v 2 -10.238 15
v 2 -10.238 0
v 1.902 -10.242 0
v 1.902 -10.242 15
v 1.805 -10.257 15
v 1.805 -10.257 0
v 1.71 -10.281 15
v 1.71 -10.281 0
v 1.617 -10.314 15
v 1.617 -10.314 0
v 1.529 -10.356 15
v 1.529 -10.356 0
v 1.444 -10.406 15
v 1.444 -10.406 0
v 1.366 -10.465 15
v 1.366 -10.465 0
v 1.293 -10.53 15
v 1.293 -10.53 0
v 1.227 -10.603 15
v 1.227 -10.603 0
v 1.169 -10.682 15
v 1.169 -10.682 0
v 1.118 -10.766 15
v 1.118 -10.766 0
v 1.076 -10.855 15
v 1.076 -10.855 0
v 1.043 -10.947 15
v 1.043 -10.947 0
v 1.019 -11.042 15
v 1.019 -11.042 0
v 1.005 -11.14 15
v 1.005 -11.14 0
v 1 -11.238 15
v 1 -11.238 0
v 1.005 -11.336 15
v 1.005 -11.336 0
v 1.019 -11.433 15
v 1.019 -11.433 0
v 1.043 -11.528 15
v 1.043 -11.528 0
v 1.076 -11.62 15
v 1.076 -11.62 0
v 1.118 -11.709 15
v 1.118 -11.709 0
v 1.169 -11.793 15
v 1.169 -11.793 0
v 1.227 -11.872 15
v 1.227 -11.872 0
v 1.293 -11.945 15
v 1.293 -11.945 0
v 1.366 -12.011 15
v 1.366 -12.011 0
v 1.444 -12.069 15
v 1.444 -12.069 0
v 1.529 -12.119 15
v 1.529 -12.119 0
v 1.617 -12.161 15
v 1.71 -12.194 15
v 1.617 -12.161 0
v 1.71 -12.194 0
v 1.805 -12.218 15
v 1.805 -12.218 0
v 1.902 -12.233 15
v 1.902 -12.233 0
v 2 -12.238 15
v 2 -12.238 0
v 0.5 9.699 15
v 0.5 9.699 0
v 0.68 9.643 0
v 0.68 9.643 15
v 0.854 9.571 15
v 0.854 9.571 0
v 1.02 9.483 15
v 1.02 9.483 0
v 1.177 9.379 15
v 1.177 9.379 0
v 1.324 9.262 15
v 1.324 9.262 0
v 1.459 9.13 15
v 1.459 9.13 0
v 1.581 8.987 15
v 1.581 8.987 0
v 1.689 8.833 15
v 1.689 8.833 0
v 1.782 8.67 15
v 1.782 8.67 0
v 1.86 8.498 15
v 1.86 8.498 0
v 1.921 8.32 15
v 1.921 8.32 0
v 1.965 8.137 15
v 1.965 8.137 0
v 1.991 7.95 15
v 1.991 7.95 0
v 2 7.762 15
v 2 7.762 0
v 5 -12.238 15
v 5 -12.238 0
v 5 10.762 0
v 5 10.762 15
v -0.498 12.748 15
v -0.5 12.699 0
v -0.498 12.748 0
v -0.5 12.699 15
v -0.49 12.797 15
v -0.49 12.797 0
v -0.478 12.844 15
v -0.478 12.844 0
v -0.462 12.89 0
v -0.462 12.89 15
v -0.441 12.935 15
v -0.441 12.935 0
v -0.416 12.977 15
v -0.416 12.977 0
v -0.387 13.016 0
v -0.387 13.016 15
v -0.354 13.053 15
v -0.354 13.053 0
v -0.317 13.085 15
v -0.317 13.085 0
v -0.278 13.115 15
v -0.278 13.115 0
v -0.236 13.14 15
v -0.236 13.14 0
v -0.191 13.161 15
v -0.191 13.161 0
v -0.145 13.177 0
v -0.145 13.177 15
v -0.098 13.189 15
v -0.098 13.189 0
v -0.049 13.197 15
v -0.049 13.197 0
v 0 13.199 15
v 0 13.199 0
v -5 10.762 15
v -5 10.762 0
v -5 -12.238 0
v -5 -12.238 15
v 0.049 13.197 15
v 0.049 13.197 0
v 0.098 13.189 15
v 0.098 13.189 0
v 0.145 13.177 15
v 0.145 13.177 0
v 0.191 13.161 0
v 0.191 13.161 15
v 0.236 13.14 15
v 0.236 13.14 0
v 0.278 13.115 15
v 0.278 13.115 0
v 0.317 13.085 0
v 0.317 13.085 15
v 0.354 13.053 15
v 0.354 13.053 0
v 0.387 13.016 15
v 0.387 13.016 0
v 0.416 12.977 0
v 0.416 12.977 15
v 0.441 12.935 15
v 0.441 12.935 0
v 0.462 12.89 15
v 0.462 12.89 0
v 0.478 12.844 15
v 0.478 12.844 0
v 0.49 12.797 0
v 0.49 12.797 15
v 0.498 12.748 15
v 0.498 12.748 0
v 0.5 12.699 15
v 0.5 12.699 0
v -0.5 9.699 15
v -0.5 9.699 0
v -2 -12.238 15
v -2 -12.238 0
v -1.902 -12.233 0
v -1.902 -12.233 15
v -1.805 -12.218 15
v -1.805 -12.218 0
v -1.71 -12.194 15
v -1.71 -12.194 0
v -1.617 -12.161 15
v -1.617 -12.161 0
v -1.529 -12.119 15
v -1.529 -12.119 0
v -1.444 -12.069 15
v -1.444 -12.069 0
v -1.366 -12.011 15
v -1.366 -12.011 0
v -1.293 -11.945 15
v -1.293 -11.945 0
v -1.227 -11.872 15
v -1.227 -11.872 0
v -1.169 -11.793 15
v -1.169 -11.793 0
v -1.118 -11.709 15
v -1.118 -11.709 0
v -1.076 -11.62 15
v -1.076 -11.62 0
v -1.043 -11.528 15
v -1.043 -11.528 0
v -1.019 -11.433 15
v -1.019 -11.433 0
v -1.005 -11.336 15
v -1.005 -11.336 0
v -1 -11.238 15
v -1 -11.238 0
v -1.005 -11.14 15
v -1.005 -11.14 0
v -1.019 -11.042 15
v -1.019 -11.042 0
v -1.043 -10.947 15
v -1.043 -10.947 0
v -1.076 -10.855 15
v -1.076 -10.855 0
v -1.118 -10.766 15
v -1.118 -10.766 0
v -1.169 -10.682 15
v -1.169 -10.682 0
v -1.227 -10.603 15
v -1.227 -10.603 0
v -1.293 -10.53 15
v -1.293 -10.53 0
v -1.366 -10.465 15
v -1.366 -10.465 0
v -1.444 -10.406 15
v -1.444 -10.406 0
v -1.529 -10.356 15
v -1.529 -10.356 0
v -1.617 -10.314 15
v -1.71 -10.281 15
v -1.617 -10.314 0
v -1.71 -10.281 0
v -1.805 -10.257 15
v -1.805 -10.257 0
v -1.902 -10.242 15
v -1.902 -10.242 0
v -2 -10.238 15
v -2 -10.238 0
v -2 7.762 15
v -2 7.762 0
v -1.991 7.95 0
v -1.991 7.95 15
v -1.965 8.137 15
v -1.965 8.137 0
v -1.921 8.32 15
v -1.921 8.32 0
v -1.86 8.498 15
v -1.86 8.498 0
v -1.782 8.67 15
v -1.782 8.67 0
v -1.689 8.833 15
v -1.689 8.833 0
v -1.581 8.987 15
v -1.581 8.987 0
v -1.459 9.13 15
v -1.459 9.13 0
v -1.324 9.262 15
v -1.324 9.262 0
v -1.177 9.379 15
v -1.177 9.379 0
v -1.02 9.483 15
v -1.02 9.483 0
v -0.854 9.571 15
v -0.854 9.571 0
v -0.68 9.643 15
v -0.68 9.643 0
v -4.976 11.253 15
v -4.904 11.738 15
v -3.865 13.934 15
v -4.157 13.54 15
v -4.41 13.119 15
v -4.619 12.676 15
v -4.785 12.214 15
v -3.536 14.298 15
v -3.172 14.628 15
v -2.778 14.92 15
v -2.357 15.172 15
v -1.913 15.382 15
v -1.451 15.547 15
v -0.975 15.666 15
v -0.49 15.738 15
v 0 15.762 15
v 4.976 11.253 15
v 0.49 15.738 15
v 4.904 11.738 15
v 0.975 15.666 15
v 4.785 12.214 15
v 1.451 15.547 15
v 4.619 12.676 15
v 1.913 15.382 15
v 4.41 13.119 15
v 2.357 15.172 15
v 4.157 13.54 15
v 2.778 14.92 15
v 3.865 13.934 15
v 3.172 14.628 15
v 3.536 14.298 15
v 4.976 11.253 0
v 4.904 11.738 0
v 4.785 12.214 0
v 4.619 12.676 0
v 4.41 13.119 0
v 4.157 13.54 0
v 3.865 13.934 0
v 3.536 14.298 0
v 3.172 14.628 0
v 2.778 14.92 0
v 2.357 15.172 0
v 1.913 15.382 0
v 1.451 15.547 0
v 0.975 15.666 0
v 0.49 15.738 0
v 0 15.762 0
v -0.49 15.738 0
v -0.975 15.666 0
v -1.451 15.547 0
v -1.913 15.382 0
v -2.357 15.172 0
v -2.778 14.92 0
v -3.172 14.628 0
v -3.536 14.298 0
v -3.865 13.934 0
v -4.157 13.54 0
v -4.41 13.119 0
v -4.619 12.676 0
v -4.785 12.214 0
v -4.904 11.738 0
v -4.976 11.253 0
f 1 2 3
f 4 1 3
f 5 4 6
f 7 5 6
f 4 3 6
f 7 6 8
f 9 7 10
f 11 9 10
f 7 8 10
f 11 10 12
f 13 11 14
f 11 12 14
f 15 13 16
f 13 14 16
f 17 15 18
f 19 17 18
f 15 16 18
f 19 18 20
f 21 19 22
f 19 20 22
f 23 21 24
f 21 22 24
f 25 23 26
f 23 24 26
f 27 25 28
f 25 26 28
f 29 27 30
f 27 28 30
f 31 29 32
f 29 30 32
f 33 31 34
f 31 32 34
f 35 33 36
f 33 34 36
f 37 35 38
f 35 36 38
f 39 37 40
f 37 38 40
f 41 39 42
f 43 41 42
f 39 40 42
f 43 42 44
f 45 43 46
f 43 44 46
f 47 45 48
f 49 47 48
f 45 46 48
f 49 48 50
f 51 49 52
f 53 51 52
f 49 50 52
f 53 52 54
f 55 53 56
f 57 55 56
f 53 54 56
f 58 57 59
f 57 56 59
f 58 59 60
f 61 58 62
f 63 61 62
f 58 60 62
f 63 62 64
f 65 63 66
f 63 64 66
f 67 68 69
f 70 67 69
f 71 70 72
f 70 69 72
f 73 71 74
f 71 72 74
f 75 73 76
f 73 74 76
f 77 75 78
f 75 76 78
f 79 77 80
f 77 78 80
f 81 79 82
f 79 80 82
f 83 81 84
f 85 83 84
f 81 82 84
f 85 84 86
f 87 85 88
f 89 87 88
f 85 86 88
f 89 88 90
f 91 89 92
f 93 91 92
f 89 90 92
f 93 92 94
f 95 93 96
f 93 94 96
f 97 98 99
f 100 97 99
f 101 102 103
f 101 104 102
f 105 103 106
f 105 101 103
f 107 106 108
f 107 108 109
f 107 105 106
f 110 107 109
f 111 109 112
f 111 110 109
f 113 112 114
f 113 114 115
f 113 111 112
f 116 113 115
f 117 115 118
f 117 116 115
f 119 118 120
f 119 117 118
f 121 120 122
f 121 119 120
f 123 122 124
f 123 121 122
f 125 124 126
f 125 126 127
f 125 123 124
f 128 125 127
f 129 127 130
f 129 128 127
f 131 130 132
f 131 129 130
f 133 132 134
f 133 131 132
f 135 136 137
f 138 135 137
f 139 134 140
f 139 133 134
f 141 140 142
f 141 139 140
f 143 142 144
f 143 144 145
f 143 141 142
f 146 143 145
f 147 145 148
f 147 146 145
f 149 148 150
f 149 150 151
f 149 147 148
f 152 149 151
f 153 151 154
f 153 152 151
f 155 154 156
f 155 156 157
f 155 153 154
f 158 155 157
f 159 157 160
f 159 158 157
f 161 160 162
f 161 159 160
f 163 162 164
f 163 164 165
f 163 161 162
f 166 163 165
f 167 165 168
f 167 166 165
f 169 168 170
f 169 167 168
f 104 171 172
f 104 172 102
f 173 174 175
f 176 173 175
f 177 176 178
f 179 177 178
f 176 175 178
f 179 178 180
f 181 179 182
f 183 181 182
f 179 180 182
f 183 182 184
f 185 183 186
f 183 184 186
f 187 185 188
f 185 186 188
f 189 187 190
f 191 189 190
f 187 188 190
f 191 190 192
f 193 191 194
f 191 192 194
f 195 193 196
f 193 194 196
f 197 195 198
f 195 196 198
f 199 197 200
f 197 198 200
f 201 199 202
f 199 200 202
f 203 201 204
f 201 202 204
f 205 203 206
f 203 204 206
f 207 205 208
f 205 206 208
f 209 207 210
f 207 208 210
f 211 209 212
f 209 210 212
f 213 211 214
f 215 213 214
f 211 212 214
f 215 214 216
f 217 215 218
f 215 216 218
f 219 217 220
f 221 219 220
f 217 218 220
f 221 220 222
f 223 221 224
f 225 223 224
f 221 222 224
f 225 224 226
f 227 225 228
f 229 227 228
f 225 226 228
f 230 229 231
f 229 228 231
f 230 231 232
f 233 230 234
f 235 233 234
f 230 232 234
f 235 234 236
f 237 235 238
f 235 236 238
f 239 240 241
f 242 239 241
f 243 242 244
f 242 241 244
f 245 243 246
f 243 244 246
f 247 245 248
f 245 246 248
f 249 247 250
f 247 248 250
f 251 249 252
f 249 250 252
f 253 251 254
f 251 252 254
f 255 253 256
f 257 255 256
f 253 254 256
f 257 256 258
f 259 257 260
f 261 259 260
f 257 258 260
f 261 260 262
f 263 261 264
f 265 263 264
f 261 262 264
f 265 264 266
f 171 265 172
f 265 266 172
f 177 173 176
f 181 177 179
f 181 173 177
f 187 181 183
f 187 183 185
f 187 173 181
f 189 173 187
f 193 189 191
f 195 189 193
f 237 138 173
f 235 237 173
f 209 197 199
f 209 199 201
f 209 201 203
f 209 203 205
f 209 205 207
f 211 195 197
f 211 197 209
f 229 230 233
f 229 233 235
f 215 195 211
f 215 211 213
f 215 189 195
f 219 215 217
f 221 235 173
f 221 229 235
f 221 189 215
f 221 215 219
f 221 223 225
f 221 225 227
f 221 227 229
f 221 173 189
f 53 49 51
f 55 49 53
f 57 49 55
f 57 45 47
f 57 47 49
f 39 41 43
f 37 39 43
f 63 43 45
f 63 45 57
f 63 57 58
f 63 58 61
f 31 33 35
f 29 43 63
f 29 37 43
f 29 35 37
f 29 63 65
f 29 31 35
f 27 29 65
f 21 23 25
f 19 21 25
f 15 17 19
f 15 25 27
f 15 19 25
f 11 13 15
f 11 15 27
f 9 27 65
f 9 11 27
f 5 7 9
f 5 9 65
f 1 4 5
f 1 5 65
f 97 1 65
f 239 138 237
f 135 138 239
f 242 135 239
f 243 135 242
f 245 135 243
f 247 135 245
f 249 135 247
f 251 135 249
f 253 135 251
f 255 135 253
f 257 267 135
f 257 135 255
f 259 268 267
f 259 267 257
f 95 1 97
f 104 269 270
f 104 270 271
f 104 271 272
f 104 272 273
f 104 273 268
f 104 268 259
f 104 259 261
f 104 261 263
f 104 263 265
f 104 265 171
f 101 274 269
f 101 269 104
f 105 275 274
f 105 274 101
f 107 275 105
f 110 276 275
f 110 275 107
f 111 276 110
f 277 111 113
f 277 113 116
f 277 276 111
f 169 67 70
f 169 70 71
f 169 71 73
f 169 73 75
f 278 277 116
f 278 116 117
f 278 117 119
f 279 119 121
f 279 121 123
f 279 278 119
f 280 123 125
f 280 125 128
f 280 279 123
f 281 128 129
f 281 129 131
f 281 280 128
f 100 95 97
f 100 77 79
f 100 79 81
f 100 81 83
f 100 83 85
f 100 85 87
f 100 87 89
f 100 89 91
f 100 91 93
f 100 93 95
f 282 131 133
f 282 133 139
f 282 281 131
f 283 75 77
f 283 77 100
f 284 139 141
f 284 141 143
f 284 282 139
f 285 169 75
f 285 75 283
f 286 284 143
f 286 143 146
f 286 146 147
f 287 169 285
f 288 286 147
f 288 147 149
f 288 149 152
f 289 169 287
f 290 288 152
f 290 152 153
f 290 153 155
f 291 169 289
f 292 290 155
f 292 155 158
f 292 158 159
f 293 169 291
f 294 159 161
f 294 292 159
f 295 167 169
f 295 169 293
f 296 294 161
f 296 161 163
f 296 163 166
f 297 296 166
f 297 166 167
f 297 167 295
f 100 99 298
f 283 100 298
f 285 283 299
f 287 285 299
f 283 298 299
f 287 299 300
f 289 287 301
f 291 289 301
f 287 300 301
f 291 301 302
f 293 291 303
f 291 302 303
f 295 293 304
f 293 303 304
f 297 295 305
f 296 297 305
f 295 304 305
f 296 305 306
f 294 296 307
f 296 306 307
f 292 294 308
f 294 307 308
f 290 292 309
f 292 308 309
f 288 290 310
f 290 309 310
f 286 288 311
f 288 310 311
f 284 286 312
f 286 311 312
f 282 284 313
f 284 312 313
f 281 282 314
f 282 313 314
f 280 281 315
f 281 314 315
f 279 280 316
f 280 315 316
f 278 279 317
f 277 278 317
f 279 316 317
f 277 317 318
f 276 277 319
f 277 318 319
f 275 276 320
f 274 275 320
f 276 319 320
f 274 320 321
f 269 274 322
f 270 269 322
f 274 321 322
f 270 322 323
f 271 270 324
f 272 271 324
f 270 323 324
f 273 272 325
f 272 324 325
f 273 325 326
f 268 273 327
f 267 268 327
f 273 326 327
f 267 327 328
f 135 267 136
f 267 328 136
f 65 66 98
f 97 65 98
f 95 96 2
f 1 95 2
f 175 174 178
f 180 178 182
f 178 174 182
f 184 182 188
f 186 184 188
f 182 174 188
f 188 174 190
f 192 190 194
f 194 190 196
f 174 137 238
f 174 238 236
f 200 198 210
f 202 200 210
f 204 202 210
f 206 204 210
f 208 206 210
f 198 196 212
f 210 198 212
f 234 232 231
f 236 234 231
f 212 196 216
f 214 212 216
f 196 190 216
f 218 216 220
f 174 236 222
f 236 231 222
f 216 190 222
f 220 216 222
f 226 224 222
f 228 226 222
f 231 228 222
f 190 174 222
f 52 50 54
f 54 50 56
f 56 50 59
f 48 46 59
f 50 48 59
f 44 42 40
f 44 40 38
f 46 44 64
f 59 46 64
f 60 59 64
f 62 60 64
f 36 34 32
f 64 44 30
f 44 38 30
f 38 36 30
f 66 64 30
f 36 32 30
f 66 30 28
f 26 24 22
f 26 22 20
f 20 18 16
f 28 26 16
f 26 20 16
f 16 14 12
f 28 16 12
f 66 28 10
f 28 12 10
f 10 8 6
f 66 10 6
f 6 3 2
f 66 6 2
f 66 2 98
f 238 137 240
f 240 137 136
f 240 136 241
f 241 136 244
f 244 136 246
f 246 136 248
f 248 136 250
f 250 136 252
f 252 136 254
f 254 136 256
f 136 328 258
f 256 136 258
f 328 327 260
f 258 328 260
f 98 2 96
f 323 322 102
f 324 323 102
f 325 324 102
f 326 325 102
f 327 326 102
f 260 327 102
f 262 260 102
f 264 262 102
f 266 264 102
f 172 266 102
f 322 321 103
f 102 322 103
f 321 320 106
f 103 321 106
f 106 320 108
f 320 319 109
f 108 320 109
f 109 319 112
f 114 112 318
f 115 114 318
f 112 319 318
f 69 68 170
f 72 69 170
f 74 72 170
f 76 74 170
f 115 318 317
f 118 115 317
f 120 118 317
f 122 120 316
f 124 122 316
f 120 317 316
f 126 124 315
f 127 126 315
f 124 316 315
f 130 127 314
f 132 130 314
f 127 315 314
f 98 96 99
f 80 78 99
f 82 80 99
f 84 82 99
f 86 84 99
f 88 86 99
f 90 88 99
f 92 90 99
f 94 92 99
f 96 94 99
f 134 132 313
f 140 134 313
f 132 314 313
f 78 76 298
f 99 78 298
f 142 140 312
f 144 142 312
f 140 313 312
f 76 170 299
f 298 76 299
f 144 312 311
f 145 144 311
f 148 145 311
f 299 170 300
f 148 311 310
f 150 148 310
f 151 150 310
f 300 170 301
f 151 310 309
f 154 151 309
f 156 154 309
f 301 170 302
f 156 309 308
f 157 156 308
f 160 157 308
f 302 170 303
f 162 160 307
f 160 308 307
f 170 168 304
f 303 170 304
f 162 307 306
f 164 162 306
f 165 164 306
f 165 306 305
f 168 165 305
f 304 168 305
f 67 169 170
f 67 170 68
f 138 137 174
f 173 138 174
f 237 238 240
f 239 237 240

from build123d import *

# Parameters (mm, degrees)
F1_DEPTH = 15
F2_R     = 0.49999


# Not quite as in the source:
# - a fillet or chamfer is up to 0.001 mm smaller than in the source, because OpenCascade refuses the exact size


with BuildPart() as f1:
    # F0 (on Top) → F1 (new body)
    with BuildSketch(Plane.XY):
        with BuildLine():
            Line((-5, -12.237534521), (-2, -12.237534521))
            ThreePointArc((-2, -12.237534521), (-1, -11.237534521), (-2, -10.237534521))
            Line((-2, -10.237534521), (-2, 7.762465479))
            ThreePointArc((-2, 7.762465479), (-1.5811388301, 8.9872103504), (-0.5, 9.6989571521))
            Line((-0.5, 9.6989571521), (-0.5, 13.1989571521))
            Line((-0.5, 13.1989571521), (0.5, 13.1989571521))
            Line((0.5, 13.1989571521), (0.5, 9.6989571521))
            ThreePointArc((0.5, 9.6989571521), (1.5811388301, 8.9872103504), (2, 7.762465479))
            Line((2, 7.762465479), (2, -10.237534521))
            ThreePointArc((2, -10.237534521), (1, -11.237534521), (2, -12.237534521))
            Line((2, -12.237534521), (5, -12.237534521))
            Line((5, -12.237534521), (5, 10.762465479))
            ThreePointArc((5, 10.762465479), (0, 15.762465479), (-5, 10.762465479))
            Line((-5, 10.762465479), (-5, -12.237534521))
        make_face()
    extrude(amount=F1_DEPTH)

    # F2 (radius 0.5 in the source; OpenCascade refuses exactly that, so slightly less here)
    f2_edges = [f1.edges().sort_by_distance(p)[0] for p in [
        (-0.5, 13.198957, 7.5),
        (0.5, 13.198957, 7.5),
    ]]
    fillet(f2_edges, radius=F2_R)


solid = f1.part
